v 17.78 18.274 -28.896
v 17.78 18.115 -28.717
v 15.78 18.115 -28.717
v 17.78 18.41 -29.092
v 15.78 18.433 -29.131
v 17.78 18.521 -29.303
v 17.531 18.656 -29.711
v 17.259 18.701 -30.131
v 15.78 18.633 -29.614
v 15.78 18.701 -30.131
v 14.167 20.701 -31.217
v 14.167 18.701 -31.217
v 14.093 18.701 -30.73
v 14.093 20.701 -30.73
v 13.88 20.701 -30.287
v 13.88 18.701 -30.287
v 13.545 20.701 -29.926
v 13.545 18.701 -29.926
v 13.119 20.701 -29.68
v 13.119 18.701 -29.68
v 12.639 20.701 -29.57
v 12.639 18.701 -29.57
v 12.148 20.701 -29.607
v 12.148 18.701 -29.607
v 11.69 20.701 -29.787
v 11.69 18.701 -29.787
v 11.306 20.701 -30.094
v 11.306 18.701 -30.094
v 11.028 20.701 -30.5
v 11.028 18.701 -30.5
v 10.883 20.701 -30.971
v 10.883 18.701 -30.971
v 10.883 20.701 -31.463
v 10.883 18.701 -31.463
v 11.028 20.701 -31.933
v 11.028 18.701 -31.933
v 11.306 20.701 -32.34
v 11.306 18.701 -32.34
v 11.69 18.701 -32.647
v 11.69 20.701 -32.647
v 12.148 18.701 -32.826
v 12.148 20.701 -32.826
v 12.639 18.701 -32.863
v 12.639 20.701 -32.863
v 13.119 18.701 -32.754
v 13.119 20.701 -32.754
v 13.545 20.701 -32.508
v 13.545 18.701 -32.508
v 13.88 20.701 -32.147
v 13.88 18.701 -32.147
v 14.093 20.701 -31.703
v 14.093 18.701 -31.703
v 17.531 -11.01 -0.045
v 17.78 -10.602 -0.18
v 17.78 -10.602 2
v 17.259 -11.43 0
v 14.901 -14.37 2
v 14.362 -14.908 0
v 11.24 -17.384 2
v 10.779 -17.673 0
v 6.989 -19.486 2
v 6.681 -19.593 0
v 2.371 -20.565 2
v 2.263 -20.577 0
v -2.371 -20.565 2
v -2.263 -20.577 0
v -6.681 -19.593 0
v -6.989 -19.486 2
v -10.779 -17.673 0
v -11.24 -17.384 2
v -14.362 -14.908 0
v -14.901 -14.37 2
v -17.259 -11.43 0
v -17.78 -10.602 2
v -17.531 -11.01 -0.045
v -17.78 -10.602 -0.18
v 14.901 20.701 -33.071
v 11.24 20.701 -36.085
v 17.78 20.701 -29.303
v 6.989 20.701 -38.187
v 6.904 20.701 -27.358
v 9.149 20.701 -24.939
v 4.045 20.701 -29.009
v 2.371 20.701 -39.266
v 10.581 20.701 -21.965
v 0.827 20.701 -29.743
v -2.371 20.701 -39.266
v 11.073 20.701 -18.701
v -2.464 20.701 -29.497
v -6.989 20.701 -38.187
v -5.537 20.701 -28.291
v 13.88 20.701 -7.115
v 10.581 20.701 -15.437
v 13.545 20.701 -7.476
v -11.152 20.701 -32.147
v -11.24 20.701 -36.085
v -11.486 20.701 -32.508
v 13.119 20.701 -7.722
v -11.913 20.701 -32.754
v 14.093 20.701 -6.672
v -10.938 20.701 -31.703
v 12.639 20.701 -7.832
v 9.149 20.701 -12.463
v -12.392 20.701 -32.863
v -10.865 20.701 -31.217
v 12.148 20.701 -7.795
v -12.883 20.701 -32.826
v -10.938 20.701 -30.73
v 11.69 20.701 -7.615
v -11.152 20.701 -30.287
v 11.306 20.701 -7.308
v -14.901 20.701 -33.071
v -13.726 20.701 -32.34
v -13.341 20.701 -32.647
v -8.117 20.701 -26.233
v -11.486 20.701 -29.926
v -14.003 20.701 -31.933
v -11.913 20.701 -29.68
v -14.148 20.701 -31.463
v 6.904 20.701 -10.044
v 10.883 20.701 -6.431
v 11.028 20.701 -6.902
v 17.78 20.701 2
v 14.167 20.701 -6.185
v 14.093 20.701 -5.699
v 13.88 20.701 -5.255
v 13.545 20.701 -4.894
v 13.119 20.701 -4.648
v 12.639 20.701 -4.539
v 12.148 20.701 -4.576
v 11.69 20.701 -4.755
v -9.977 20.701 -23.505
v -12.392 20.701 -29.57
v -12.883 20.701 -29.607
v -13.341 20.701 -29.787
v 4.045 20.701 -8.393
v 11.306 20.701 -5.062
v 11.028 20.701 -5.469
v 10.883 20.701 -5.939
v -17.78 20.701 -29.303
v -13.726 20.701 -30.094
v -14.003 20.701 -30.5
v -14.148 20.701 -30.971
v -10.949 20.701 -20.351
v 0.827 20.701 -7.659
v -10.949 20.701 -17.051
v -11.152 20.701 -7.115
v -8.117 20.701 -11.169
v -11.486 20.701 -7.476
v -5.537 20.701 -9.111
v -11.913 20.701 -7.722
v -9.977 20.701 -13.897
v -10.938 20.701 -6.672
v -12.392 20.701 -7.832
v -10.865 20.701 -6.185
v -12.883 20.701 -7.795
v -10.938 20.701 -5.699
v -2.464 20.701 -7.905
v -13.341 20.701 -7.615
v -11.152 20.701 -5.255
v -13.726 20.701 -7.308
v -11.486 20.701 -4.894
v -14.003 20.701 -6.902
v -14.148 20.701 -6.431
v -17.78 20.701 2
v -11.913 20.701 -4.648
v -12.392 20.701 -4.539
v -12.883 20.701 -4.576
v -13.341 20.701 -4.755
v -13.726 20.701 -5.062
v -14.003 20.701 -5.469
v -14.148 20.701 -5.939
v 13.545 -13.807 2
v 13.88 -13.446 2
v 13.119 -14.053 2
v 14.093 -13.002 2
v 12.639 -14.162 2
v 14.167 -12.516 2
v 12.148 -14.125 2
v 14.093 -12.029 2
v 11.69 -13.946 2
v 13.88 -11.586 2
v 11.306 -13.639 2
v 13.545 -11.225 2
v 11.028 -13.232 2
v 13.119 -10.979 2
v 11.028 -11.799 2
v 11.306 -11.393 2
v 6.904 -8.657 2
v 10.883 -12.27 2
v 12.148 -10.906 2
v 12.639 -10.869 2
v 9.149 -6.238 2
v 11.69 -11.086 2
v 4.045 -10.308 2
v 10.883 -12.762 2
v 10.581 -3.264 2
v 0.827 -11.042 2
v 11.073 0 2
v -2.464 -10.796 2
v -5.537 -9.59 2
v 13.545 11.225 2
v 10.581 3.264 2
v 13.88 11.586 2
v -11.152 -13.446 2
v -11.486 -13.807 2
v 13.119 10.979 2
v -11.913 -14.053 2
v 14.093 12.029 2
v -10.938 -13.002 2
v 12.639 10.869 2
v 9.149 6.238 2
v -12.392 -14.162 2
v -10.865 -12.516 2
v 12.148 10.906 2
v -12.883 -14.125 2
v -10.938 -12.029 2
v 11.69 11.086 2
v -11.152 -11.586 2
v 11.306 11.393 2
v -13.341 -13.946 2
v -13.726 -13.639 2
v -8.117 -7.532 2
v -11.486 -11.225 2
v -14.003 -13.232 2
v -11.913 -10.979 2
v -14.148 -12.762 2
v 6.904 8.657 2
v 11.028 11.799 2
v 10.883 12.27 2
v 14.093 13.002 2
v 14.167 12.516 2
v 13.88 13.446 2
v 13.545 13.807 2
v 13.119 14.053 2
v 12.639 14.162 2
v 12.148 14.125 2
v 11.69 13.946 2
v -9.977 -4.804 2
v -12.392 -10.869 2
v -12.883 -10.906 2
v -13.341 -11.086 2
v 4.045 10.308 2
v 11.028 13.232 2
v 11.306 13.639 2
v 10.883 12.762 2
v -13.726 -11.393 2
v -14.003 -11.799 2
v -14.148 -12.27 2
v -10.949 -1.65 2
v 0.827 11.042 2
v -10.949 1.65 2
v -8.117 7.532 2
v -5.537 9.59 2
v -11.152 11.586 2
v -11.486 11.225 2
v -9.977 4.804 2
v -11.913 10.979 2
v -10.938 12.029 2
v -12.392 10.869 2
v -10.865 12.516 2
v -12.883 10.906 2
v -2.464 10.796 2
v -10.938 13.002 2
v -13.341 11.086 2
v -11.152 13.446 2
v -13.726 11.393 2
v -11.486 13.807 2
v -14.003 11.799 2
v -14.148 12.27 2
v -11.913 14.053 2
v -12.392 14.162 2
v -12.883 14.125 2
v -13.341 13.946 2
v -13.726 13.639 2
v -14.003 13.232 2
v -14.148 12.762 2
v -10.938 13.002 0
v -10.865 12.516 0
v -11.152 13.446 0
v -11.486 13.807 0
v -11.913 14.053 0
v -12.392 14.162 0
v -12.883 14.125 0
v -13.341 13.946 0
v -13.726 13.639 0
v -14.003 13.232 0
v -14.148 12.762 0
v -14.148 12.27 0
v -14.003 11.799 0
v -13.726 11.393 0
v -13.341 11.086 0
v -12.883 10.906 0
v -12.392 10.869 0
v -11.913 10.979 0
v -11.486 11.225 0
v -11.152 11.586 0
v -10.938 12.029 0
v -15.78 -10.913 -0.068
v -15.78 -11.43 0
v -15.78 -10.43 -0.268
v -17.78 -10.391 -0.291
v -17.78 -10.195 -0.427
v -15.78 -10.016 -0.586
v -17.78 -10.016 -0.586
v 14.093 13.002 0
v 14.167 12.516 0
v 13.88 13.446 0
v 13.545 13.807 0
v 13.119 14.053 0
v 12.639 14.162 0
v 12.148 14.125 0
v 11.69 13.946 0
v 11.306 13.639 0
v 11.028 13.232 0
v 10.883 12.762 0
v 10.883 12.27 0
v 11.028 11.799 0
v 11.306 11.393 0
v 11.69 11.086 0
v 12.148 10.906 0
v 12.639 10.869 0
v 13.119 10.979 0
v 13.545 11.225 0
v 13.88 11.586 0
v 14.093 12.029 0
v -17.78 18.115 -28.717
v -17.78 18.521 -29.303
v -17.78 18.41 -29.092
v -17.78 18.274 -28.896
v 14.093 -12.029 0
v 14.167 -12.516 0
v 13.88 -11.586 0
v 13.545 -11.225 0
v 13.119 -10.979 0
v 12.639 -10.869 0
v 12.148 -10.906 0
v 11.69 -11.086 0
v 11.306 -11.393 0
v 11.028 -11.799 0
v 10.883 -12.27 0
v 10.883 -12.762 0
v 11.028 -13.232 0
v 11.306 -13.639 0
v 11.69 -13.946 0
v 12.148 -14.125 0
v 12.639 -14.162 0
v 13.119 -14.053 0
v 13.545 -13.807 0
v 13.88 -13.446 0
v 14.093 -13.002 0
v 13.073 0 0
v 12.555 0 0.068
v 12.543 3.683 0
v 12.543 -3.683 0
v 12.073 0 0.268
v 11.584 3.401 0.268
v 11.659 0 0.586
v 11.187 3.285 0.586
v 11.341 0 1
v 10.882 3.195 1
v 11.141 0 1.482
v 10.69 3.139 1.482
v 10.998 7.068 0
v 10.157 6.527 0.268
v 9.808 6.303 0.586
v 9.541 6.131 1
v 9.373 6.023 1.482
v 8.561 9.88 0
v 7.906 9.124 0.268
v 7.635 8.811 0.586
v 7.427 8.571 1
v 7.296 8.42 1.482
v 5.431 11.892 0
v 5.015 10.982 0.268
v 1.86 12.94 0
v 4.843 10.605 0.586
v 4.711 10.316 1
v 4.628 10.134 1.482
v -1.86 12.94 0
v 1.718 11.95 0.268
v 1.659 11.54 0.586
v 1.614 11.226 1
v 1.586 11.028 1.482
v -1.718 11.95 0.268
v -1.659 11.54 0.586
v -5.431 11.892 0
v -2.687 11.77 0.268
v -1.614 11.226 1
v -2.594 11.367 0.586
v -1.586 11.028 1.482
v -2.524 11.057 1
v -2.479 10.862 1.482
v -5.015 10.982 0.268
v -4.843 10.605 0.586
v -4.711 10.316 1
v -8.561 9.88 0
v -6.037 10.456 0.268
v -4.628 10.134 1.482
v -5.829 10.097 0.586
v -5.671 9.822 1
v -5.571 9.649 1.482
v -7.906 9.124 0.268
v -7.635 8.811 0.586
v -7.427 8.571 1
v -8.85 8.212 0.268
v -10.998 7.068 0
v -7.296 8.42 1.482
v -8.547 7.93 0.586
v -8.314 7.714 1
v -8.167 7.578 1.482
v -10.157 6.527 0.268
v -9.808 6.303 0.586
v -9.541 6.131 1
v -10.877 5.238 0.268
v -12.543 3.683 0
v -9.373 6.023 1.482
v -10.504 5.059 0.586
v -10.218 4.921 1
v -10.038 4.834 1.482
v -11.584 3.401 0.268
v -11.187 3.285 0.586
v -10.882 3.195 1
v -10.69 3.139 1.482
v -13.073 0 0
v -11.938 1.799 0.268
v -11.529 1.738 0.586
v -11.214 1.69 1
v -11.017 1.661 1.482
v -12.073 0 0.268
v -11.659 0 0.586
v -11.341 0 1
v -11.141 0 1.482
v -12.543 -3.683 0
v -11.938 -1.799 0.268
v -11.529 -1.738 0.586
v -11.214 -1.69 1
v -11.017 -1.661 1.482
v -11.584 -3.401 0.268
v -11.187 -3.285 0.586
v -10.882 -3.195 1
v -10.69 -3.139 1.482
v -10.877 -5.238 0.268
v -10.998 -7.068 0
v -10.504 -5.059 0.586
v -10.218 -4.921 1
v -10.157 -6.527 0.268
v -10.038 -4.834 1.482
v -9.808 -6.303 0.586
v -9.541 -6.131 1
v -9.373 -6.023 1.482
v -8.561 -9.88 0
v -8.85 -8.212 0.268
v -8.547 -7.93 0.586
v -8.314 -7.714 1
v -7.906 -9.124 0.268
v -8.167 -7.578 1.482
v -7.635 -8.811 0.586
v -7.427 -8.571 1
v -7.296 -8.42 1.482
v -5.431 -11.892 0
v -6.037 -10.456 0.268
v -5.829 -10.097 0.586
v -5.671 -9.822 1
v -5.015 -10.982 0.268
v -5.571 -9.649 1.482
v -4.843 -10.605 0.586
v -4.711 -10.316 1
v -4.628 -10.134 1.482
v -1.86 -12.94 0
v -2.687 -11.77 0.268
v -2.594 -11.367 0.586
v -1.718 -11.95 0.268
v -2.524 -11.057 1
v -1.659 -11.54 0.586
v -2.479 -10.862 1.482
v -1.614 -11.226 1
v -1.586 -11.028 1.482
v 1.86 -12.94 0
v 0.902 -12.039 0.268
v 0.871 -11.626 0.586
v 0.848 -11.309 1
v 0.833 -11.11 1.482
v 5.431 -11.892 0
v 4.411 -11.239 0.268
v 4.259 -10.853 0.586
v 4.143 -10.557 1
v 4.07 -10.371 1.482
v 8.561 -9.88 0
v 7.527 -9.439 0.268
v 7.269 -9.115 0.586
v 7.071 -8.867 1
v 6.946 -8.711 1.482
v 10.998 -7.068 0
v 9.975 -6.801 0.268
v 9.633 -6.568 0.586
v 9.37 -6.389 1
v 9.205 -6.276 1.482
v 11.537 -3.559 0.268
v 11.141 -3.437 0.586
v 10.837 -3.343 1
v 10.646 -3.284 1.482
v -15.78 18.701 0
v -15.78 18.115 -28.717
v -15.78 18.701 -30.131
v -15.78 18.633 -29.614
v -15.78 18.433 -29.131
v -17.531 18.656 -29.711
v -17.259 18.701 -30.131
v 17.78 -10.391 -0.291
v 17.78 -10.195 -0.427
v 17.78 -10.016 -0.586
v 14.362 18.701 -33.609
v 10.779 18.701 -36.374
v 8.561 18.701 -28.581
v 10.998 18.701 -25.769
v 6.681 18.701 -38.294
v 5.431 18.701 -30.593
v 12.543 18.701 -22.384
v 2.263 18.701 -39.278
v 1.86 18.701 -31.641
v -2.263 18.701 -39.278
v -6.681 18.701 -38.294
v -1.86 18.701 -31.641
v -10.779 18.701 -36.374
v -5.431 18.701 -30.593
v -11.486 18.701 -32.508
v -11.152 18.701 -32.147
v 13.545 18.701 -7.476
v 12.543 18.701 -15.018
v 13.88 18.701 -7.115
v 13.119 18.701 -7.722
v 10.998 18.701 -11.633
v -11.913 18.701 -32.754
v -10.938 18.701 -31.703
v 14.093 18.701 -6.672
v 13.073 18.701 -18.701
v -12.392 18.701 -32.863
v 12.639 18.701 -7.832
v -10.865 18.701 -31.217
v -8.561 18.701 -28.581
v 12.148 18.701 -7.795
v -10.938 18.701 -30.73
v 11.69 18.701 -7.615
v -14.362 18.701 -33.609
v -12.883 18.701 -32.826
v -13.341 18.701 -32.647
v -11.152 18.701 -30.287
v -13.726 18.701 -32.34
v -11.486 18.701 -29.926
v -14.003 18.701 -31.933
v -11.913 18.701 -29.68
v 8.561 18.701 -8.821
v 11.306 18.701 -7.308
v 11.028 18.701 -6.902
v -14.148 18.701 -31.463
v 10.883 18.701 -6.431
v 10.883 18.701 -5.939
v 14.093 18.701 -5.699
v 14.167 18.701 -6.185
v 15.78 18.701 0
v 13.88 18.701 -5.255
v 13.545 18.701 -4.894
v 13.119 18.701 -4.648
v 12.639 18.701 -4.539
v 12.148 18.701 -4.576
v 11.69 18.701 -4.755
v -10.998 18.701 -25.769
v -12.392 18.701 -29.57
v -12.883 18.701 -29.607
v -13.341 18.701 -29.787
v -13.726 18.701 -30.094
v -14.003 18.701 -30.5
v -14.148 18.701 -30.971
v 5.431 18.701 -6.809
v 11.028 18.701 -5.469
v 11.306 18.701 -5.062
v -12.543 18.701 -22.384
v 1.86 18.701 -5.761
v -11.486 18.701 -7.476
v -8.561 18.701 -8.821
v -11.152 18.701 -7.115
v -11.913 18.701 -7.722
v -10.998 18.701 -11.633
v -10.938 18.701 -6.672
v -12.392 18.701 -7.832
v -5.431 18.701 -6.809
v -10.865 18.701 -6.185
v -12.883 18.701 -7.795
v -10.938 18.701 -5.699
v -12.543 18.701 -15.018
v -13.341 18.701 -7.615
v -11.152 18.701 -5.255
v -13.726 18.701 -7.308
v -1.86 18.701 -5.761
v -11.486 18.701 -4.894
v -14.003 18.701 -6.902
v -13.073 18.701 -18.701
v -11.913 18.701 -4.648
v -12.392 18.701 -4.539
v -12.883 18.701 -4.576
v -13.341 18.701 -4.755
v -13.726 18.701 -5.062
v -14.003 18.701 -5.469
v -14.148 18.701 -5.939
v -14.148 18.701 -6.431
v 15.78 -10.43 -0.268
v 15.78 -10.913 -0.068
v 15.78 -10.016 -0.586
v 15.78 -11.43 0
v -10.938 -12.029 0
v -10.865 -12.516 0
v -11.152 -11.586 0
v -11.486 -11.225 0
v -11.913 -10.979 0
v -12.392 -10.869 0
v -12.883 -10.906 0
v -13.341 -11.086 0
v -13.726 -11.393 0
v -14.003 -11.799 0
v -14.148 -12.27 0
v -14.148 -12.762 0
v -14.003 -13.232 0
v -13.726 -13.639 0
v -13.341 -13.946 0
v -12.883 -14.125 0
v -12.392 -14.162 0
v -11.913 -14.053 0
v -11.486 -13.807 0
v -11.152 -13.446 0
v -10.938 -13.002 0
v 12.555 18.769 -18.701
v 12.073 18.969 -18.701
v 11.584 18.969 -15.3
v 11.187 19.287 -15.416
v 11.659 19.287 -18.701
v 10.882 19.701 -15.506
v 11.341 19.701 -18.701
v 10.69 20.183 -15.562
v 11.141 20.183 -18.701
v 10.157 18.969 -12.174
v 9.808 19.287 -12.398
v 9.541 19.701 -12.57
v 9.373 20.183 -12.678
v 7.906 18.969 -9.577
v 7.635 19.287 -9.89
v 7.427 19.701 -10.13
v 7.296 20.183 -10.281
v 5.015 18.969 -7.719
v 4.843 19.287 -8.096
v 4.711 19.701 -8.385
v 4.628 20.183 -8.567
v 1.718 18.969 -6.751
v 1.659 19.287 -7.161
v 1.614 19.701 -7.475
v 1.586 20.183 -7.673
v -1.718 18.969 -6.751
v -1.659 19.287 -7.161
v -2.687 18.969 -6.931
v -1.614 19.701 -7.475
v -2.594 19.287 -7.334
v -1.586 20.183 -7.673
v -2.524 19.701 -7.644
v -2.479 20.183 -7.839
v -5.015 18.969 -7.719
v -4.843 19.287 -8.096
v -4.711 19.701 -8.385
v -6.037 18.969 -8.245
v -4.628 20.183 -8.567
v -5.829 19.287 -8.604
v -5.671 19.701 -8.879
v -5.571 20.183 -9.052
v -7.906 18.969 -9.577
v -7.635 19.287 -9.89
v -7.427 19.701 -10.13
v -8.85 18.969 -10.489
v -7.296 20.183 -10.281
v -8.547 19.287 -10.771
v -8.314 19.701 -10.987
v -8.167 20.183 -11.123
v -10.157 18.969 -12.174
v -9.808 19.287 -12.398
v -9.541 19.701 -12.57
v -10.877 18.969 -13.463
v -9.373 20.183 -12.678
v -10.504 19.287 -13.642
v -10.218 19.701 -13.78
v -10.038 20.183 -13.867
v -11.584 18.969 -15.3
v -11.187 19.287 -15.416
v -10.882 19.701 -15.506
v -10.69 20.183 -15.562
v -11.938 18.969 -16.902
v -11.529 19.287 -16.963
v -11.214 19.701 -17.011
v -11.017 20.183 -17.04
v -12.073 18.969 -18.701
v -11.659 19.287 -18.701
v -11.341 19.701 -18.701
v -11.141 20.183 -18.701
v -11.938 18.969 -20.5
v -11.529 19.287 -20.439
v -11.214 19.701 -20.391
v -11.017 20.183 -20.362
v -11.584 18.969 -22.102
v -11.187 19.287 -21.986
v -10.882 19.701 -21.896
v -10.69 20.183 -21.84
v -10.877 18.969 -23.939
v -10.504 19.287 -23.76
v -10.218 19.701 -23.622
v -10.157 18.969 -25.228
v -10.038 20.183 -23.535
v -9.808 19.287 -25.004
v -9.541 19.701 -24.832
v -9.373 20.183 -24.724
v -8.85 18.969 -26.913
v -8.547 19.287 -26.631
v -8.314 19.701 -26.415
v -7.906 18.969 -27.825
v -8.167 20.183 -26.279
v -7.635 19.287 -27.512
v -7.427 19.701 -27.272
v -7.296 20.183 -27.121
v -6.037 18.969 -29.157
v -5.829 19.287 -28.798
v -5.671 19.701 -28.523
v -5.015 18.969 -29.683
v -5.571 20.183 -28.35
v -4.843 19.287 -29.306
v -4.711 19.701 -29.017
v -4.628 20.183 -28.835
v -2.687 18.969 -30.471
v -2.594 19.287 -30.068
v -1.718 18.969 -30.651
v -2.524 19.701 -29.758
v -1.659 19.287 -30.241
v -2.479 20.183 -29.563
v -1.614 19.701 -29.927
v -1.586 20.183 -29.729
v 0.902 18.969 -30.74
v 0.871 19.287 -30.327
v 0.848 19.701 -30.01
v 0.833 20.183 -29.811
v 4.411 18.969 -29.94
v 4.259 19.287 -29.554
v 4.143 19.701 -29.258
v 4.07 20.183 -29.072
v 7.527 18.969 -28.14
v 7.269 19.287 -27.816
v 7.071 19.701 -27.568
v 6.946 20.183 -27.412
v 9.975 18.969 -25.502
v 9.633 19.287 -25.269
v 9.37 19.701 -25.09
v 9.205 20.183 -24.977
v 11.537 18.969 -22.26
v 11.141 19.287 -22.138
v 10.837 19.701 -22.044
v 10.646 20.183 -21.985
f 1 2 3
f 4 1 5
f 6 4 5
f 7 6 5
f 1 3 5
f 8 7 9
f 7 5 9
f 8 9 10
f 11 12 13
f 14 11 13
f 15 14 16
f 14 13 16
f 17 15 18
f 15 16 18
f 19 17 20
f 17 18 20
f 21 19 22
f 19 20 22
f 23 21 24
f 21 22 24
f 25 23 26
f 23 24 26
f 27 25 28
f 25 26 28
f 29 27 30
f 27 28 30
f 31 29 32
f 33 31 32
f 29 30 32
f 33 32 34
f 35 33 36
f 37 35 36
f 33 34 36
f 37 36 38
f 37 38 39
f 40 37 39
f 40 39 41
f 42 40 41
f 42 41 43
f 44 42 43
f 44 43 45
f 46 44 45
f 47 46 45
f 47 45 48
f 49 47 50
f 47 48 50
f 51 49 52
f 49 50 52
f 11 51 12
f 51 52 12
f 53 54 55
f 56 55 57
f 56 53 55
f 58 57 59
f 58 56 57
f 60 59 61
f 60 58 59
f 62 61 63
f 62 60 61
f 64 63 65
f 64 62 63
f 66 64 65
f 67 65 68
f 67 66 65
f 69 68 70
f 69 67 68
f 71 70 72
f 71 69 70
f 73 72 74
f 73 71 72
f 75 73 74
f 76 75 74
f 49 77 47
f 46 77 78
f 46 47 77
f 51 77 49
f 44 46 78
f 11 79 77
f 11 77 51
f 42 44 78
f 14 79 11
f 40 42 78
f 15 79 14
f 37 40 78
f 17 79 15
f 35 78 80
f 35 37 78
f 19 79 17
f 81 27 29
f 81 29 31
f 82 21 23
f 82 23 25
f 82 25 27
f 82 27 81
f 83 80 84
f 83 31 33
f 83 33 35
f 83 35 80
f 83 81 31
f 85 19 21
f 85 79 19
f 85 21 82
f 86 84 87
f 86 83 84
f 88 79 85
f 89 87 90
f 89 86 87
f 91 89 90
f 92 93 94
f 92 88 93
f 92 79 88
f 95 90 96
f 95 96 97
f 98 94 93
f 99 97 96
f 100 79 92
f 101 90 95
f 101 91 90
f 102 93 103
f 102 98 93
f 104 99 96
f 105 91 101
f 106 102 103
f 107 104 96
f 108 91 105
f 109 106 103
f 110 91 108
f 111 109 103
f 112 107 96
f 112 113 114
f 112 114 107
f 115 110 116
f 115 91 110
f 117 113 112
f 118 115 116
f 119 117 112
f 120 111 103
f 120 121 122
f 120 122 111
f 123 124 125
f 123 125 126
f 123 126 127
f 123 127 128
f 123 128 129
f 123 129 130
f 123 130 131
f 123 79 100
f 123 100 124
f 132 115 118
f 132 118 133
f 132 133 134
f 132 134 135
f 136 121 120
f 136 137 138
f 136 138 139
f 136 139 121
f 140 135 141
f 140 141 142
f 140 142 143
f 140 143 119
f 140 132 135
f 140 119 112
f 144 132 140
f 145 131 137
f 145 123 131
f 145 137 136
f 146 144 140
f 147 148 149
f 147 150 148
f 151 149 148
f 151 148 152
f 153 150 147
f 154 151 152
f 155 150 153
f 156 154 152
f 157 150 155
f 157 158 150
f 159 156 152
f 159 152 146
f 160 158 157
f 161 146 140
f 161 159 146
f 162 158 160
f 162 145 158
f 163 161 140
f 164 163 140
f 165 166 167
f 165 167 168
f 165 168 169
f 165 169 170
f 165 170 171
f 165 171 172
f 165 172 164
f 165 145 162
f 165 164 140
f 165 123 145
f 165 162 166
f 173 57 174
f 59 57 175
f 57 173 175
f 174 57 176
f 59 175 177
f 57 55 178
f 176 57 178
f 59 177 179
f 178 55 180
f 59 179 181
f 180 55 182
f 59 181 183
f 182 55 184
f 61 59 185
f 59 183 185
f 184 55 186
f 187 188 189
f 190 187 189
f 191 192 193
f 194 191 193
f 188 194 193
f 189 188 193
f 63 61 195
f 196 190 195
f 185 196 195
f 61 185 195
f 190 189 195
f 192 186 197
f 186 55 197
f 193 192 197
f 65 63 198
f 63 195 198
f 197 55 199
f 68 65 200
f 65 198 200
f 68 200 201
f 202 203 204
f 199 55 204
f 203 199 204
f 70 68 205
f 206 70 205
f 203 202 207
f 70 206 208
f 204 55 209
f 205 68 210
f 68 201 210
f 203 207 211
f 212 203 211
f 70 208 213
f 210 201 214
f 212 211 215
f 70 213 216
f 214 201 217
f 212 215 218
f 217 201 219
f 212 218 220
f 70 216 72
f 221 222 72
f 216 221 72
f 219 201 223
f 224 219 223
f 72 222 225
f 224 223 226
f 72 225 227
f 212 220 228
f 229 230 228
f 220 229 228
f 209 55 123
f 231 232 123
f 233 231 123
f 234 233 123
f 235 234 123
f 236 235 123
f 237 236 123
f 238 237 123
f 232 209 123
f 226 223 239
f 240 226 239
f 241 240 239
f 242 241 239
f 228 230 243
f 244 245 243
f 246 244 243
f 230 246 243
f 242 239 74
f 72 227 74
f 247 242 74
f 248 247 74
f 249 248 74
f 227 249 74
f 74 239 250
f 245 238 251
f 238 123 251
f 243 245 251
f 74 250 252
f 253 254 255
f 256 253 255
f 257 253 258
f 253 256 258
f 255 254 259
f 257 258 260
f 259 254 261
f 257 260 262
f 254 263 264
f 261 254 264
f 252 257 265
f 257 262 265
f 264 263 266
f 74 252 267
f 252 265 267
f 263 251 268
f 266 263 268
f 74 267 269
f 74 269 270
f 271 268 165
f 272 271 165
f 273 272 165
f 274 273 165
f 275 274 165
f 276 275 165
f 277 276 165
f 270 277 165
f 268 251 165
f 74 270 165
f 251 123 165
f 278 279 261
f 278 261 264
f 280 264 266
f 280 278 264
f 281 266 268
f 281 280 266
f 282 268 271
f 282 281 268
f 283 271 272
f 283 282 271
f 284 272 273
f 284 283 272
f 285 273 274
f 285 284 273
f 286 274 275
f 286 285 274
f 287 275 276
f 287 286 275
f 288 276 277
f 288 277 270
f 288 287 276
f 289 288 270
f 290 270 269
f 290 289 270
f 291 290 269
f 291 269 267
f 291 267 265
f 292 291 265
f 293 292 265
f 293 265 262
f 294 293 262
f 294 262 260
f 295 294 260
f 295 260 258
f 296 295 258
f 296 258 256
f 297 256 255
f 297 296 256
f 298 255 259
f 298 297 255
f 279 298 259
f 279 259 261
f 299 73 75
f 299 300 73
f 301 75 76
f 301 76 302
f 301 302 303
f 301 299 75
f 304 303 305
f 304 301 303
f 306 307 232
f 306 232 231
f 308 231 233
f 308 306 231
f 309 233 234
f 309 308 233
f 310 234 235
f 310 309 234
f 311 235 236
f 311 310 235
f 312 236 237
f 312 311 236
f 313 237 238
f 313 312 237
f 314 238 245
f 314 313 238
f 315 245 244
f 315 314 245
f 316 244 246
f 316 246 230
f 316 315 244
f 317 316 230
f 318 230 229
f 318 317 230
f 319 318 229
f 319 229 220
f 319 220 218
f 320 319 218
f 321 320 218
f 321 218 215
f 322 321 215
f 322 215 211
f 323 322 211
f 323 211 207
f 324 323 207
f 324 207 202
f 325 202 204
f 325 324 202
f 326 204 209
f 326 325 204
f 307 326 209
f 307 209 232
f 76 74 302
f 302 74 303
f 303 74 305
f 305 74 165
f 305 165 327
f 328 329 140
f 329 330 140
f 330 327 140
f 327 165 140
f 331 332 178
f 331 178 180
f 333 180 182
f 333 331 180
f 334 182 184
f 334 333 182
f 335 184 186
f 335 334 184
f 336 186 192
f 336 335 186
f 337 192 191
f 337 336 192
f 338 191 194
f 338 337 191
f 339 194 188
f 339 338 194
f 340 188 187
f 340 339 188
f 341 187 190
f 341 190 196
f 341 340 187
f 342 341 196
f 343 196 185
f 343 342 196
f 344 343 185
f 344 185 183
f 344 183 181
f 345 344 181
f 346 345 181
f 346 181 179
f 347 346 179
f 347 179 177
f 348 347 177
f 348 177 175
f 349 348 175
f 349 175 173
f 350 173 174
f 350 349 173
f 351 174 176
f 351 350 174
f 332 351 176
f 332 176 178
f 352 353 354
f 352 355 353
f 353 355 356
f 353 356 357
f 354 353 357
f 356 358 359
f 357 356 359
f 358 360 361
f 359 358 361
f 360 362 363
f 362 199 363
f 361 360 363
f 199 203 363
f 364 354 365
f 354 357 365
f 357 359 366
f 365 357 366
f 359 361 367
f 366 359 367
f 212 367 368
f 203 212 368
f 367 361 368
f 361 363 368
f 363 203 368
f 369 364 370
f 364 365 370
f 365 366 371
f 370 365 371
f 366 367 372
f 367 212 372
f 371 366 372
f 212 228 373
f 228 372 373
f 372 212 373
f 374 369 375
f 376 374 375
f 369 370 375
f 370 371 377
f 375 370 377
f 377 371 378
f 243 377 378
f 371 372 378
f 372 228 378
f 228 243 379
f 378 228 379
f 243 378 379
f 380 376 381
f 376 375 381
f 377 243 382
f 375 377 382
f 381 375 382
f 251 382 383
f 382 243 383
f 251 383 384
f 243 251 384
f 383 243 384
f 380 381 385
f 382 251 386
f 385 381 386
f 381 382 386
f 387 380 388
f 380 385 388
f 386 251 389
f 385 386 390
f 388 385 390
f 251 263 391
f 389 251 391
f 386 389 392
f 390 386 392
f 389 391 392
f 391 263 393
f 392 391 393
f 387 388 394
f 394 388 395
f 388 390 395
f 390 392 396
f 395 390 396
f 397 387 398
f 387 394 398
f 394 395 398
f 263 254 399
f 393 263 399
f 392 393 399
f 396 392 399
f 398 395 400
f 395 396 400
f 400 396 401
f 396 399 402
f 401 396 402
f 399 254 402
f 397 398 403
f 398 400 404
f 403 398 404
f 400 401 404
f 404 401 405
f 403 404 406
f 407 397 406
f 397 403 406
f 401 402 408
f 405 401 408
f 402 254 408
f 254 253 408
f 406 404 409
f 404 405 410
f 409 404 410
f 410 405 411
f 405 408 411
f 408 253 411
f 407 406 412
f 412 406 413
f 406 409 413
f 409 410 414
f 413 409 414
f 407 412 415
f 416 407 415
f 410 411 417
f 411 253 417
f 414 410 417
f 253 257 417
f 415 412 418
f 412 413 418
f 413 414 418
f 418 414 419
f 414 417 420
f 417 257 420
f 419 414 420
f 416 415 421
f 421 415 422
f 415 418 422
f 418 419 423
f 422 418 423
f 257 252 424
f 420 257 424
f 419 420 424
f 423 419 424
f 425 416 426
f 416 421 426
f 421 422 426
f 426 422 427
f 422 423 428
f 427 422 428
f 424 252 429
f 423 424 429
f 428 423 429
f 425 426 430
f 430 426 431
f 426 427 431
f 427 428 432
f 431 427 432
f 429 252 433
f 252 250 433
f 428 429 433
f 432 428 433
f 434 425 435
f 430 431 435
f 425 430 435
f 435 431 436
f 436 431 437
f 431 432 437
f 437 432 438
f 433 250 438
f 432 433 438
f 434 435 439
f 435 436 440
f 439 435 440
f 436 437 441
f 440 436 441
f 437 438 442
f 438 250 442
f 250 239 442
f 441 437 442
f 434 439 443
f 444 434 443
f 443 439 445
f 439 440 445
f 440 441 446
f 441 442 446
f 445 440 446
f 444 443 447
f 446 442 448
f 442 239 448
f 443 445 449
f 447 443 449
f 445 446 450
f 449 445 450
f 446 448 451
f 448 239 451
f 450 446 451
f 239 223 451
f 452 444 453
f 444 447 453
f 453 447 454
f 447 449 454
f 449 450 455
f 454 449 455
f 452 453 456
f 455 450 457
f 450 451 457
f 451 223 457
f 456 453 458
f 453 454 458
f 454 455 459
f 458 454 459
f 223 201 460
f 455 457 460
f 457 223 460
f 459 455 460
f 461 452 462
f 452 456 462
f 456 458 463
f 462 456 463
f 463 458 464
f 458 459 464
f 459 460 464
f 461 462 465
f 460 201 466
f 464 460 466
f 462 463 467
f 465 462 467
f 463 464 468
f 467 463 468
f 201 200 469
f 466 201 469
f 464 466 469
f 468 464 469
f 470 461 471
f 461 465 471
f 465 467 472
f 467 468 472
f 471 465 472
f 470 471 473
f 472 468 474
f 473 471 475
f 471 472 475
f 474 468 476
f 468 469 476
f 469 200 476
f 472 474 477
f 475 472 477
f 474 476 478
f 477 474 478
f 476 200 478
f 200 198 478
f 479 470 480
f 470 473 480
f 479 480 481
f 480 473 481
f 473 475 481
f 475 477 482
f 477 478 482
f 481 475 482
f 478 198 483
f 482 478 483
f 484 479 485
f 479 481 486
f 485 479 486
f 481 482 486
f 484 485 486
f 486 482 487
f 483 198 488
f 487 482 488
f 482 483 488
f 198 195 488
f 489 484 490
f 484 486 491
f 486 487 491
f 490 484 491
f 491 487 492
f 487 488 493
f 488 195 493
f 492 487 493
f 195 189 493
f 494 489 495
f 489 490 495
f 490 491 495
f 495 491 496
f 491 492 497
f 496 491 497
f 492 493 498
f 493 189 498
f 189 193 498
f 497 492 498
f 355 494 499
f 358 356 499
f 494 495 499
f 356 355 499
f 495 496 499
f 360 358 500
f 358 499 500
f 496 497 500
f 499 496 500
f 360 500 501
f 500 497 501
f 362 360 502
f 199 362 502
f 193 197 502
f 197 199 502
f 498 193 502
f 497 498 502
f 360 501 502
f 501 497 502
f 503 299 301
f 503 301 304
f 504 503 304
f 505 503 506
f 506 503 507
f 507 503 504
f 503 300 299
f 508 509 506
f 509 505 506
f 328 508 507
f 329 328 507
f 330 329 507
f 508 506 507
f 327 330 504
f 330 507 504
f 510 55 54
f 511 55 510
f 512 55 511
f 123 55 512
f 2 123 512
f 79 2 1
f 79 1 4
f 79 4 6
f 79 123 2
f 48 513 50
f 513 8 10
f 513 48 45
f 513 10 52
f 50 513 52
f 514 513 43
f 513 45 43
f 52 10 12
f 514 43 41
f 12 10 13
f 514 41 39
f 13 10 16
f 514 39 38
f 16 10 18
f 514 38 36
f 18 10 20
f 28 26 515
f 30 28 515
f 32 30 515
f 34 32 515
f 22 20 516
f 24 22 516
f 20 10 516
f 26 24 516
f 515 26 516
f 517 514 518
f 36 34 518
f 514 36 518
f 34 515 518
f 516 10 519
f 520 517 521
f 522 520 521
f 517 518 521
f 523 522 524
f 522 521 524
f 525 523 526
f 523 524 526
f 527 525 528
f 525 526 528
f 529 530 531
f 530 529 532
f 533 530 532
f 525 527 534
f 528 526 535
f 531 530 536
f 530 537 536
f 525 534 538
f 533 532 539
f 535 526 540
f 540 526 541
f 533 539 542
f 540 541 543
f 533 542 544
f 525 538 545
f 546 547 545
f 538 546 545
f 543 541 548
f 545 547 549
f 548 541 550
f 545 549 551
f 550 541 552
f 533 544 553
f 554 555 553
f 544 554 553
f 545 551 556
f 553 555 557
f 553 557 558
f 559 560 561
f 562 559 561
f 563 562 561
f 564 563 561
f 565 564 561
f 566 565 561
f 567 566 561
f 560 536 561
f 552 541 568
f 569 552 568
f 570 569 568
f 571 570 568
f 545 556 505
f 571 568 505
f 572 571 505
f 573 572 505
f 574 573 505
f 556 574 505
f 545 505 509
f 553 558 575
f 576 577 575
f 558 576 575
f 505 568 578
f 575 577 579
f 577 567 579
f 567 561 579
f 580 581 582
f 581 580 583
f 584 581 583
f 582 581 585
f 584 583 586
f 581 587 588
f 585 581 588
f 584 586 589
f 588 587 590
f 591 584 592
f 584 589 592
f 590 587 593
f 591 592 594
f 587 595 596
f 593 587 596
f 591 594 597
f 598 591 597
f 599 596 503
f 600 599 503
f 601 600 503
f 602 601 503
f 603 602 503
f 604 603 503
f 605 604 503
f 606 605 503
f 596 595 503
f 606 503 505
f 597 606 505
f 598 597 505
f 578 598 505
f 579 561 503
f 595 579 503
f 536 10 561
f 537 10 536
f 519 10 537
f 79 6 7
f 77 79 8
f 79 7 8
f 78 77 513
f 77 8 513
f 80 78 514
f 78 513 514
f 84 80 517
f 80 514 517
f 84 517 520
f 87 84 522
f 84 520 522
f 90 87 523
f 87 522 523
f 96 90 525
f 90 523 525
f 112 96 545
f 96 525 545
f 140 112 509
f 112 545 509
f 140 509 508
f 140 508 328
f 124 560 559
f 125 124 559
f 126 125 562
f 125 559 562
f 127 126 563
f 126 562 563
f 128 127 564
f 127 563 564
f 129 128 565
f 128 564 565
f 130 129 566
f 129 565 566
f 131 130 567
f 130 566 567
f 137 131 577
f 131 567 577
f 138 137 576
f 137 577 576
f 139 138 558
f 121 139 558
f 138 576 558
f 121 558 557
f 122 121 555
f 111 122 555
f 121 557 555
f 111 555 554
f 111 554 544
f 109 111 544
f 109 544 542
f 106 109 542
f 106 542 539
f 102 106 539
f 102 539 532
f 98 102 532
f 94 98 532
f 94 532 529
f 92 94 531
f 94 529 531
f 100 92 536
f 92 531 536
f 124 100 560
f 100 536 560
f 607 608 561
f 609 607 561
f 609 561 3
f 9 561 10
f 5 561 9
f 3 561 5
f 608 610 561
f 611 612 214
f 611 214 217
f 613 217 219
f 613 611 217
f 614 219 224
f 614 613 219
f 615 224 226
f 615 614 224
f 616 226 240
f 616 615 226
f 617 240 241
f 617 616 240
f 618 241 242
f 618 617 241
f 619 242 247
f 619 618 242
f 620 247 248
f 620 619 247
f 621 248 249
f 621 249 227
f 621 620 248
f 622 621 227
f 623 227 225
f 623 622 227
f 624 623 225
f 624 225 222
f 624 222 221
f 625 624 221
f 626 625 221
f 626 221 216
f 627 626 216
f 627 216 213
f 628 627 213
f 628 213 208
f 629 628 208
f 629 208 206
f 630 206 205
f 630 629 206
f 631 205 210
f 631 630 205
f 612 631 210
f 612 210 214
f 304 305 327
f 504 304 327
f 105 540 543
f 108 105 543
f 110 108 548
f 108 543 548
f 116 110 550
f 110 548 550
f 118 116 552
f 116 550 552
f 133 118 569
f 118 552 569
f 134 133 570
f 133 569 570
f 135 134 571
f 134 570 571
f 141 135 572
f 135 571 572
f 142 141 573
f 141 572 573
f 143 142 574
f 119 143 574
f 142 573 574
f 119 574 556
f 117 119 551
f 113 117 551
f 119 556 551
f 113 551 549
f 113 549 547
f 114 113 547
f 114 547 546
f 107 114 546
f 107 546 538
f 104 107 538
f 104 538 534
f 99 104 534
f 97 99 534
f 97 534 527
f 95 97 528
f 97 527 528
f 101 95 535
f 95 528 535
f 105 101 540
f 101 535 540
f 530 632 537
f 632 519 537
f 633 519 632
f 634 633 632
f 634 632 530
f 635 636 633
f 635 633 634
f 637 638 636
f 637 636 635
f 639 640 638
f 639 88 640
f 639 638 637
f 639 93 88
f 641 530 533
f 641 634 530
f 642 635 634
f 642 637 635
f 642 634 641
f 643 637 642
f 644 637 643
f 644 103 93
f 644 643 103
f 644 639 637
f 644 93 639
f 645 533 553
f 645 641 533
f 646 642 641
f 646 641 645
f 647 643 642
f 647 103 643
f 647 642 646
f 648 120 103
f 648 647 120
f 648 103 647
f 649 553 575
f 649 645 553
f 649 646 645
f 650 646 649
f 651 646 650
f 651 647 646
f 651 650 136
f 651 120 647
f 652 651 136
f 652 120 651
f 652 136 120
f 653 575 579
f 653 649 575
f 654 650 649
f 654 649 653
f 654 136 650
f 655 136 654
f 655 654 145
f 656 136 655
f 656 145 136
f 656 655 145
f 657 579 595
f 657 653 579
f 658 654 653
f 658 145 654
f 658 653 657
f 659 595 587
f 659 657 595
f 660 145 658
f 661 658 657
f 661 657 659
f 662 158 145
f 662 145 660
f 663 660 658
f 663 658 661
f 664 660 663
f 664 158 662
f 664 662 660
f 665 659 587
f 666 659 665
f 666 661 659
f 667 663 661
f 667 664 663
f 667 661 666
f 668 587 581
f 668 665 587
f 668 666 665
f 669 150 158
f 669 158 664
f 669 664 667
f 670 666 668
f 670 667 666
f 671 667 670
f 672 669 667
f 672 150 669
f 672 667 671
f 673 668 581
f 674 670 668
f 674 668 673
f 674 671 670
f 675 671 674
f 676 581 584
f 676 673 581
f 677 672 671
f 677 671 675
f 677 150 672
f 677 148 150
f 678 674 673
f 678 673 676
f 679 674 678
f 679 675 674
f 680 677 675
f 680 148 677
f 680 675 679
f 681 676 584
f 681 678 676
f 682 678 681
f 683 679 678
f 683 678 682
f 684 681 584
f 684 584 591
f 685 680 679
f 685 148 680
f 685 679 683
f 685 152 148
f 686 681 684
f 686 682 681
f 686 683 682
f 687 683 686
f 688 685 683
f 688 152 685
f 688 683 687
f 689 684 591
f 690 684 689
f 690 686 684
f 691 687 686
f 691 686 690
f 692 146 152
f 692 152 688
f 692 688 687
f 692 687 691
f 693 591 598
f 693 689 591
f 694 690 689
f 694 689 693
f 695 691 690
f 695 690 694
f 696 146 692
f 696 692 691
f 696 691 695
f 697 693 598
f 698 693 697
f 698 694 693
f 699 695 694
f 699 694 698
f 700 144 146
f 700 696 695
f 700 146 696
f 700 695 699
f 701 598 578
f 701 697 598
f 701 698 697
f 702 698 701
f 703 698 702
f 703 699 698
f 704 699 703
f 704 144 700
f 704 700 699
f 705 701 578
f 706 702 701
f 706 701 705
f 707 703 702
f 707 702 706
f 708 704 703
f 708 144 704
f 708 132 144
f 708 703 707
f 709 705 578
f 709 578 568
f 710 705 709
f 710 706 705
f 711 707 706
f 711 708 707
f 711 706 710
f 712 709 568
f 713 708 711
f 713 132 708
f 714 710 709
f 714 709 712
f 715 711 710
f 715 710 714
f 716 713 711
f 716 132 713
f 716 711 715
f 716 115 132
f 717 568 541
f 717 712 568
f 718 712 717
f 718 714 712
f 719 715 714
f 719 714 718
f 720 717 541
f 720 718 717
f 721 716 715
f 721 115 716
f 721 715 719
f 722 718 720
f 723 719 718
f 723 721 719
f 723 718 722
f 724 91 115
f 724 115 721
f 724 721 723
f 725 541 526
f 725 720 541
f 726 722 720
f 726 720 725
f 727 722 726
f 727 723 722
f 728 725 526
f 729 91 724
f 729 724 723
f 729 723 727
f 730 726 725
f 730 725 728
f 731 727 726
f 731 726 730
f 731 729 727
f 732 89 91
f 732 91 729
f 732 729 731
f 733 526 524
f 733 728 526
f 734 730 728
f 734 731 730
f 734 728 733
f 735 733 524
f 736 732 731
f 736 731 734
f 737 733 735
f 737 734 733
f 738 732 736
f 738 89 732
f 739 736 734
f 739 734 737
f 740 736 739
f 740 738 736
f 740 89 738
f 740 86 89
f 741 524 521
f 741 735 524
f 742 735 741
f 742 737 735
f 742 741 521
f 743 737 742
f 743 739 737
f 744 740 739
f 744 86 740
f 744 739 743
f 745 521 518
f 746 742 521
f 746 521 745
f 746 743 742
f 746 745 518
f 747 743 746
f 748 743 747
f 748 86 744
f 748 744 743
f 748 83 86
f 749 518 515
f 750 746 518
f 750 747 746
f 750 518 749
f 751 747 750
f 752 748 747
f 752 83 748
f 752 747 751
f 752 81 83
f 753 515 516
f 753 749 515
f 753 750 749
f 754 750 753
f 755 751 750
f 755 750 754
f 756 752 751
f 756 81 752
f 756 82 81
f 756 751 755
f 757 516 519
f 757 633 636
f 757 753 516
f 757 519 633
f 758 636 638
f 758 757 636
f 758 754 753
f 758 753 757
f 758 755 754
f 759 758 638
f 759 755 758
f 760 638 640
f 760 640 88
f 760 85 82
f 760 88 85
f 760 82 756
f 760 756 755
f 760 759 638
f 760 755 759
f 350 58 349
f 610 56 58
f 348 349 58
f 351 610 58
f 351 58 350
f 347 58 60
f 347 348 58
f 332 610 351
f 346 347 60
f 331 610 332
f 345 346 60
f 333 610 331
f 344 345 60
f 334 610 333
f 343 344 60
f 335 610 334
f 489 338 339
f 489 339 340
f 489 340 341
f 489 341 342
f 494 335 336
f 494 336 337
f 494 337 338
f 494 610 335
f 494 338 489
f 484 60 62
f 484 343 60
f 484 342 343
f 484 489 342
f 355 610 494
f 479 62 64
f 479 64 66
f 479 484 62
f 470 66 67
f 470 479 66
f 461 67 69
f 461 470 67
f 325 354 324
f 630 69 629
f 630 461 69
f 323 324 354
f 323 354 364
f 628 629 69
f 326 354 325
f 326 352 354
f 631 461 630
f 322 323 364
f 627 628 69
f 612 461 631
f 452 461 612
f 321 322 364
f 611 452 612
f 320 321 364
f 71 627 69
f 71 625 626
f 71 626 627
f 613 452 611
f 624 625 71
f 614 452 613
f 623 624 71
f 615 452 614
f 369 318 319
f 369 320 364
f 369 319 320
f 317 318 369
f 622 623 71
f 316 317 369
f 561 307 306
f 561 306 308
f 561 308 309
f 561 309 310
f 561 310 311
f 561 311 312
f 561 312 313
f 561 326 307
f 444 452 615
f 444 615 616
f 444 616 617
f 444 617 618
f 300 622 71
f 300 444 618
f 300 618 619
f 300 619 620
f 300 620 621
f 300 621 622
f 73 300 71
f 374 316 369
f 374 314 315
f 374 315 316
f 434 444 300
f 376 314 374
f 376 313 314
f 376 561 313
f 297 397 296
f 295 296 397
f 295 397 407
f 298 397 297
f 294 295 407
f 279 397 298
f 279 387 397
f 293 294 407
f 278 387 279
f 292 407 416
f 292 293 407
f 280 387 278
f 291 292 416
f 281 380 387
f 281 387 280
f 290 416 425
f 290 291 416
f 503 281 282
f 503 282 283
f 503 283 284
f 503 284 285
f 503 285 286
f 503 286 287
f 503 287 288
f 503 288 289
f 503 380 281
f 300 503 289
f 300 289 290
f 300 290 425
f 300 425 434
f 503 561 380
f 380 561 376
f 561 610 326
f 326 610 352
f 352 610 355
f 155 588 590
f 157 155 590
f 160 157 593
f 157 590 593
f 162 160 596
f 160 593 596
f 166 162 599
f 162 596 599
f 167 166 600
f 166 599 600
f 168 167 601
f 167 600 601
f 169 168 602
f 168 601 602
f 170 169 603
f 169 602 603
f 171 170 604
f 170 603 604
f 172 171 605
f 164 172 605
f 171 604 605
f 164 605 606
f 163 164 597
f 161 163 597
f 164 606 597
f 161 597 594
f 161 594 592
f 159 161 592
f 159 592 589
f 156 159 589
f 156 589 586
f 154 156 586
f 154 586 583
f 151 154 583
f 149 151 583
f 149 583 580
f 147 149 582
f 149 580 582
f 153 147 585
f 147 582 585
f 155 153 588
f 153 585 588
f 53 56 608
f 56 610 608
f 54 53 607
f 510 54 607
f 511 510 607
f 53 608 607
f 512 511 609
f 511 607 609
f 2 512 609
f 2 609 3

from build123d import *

# Parameters (mm, degrees)
SKETCH1_R           = 1.651
SKETCH1_R_2         = 11.07313
BOSS_EXTRUDE1_DEPTH = 2
BOSS_EXTRUDE2_DEPTH = 2
FILLET2_R           = 2
FILLET3_R           = 2


with BuildPart() as part:
    # Sketch1 → Boss-Extrude1 (new body)
    with BuildSketch(Plane.XY):
        with BuildLine():
            Line((-17.78, -10.602028155), (-17.78, 20.701))
            Line((-17.78, 20.701), (17.78, 20.701))
            Line((17.78, 20.701), (17.78, -10.602028155))
            ThreePointArc((17.78, -10.602028155), (0, -20.701), (-17.78, -10.602028155))
        make_face()
        with Locations((-12.515790027, -12.515790027)):
            Circle(SKETCH1_R, mode=Mode.SUBTRACT)
        with Locations((12.515790027, -12.515790027)):
            Circle(SKETCH1_R, mode=Mode.SUBTRACT)
        with Locations((12.515790027, 12.515790027)):
            Circle(SKETCH1_R, mode=Mode.SUBTRACT)
        with Locations((-12.515790027, 12.515790027)):
            Circle(SKETCH1_R, mode=Mode.SUBTRACT)
        Circle(SKETCH1_R_2, mode=Mode.SUBTRACT)
    boss_extrude1 = extrude(amount=BOSS_EXTRUDE1_DEPTH)

    # Mirror1: Boss-Extrude1 across plane
    add(boss_extrude1.mirror(Plane(origin=(0, 9.3505, -9.3505), x_dir=(0, 0.7071067811865465, 0.7071067811865486), z_dir=(0, -0.7071067811865488, 0.7071067811865464))))

    # Sketch2 → Boss-Extrude2 (add)
    with BuildSketch(Plane.ZY.offset(17.78)):
        Polygon((0, -10.602028155), (-29.303028155, 18.701), (0, 18.701), align=None)
    boss_extrude2 = extrude(amount=-BOSS_EXTRUDE2_DEPTH)

    # Mirror2: Boss-Extrude2 across plane
    add(boss_extrude2.mirror(Plane(origin=(0, 0, 0), x_dir=(0, 0, 1), z_dir=(1, 0, 0))))

    # Fillet2
    fillet2_edges = [part.edges().sort_by_distance(p)[0] for p in [
        (-11.07313, 0, 0),
        (-11.07313, 18.701, -18.701),
    ]]
    fillet(fillet2_edges, radius=FILLET2_R - 0.0001)  # a hair under: the kernel refuses the full size

    # Fillet3
    fillet3_edges = [part.edges().sort_by_distance(p)[0] for p in [
        (-16.78, -10.602028155, 0),
        (-16.78, 18.701, -29.303028155),
        (16.78, -10.602028155, 0),
        (16.78, 18.701, -29.303028155),
    ]]
    fillet(fillet3_edges, radius=FILLET3_R)


solid = part.part
